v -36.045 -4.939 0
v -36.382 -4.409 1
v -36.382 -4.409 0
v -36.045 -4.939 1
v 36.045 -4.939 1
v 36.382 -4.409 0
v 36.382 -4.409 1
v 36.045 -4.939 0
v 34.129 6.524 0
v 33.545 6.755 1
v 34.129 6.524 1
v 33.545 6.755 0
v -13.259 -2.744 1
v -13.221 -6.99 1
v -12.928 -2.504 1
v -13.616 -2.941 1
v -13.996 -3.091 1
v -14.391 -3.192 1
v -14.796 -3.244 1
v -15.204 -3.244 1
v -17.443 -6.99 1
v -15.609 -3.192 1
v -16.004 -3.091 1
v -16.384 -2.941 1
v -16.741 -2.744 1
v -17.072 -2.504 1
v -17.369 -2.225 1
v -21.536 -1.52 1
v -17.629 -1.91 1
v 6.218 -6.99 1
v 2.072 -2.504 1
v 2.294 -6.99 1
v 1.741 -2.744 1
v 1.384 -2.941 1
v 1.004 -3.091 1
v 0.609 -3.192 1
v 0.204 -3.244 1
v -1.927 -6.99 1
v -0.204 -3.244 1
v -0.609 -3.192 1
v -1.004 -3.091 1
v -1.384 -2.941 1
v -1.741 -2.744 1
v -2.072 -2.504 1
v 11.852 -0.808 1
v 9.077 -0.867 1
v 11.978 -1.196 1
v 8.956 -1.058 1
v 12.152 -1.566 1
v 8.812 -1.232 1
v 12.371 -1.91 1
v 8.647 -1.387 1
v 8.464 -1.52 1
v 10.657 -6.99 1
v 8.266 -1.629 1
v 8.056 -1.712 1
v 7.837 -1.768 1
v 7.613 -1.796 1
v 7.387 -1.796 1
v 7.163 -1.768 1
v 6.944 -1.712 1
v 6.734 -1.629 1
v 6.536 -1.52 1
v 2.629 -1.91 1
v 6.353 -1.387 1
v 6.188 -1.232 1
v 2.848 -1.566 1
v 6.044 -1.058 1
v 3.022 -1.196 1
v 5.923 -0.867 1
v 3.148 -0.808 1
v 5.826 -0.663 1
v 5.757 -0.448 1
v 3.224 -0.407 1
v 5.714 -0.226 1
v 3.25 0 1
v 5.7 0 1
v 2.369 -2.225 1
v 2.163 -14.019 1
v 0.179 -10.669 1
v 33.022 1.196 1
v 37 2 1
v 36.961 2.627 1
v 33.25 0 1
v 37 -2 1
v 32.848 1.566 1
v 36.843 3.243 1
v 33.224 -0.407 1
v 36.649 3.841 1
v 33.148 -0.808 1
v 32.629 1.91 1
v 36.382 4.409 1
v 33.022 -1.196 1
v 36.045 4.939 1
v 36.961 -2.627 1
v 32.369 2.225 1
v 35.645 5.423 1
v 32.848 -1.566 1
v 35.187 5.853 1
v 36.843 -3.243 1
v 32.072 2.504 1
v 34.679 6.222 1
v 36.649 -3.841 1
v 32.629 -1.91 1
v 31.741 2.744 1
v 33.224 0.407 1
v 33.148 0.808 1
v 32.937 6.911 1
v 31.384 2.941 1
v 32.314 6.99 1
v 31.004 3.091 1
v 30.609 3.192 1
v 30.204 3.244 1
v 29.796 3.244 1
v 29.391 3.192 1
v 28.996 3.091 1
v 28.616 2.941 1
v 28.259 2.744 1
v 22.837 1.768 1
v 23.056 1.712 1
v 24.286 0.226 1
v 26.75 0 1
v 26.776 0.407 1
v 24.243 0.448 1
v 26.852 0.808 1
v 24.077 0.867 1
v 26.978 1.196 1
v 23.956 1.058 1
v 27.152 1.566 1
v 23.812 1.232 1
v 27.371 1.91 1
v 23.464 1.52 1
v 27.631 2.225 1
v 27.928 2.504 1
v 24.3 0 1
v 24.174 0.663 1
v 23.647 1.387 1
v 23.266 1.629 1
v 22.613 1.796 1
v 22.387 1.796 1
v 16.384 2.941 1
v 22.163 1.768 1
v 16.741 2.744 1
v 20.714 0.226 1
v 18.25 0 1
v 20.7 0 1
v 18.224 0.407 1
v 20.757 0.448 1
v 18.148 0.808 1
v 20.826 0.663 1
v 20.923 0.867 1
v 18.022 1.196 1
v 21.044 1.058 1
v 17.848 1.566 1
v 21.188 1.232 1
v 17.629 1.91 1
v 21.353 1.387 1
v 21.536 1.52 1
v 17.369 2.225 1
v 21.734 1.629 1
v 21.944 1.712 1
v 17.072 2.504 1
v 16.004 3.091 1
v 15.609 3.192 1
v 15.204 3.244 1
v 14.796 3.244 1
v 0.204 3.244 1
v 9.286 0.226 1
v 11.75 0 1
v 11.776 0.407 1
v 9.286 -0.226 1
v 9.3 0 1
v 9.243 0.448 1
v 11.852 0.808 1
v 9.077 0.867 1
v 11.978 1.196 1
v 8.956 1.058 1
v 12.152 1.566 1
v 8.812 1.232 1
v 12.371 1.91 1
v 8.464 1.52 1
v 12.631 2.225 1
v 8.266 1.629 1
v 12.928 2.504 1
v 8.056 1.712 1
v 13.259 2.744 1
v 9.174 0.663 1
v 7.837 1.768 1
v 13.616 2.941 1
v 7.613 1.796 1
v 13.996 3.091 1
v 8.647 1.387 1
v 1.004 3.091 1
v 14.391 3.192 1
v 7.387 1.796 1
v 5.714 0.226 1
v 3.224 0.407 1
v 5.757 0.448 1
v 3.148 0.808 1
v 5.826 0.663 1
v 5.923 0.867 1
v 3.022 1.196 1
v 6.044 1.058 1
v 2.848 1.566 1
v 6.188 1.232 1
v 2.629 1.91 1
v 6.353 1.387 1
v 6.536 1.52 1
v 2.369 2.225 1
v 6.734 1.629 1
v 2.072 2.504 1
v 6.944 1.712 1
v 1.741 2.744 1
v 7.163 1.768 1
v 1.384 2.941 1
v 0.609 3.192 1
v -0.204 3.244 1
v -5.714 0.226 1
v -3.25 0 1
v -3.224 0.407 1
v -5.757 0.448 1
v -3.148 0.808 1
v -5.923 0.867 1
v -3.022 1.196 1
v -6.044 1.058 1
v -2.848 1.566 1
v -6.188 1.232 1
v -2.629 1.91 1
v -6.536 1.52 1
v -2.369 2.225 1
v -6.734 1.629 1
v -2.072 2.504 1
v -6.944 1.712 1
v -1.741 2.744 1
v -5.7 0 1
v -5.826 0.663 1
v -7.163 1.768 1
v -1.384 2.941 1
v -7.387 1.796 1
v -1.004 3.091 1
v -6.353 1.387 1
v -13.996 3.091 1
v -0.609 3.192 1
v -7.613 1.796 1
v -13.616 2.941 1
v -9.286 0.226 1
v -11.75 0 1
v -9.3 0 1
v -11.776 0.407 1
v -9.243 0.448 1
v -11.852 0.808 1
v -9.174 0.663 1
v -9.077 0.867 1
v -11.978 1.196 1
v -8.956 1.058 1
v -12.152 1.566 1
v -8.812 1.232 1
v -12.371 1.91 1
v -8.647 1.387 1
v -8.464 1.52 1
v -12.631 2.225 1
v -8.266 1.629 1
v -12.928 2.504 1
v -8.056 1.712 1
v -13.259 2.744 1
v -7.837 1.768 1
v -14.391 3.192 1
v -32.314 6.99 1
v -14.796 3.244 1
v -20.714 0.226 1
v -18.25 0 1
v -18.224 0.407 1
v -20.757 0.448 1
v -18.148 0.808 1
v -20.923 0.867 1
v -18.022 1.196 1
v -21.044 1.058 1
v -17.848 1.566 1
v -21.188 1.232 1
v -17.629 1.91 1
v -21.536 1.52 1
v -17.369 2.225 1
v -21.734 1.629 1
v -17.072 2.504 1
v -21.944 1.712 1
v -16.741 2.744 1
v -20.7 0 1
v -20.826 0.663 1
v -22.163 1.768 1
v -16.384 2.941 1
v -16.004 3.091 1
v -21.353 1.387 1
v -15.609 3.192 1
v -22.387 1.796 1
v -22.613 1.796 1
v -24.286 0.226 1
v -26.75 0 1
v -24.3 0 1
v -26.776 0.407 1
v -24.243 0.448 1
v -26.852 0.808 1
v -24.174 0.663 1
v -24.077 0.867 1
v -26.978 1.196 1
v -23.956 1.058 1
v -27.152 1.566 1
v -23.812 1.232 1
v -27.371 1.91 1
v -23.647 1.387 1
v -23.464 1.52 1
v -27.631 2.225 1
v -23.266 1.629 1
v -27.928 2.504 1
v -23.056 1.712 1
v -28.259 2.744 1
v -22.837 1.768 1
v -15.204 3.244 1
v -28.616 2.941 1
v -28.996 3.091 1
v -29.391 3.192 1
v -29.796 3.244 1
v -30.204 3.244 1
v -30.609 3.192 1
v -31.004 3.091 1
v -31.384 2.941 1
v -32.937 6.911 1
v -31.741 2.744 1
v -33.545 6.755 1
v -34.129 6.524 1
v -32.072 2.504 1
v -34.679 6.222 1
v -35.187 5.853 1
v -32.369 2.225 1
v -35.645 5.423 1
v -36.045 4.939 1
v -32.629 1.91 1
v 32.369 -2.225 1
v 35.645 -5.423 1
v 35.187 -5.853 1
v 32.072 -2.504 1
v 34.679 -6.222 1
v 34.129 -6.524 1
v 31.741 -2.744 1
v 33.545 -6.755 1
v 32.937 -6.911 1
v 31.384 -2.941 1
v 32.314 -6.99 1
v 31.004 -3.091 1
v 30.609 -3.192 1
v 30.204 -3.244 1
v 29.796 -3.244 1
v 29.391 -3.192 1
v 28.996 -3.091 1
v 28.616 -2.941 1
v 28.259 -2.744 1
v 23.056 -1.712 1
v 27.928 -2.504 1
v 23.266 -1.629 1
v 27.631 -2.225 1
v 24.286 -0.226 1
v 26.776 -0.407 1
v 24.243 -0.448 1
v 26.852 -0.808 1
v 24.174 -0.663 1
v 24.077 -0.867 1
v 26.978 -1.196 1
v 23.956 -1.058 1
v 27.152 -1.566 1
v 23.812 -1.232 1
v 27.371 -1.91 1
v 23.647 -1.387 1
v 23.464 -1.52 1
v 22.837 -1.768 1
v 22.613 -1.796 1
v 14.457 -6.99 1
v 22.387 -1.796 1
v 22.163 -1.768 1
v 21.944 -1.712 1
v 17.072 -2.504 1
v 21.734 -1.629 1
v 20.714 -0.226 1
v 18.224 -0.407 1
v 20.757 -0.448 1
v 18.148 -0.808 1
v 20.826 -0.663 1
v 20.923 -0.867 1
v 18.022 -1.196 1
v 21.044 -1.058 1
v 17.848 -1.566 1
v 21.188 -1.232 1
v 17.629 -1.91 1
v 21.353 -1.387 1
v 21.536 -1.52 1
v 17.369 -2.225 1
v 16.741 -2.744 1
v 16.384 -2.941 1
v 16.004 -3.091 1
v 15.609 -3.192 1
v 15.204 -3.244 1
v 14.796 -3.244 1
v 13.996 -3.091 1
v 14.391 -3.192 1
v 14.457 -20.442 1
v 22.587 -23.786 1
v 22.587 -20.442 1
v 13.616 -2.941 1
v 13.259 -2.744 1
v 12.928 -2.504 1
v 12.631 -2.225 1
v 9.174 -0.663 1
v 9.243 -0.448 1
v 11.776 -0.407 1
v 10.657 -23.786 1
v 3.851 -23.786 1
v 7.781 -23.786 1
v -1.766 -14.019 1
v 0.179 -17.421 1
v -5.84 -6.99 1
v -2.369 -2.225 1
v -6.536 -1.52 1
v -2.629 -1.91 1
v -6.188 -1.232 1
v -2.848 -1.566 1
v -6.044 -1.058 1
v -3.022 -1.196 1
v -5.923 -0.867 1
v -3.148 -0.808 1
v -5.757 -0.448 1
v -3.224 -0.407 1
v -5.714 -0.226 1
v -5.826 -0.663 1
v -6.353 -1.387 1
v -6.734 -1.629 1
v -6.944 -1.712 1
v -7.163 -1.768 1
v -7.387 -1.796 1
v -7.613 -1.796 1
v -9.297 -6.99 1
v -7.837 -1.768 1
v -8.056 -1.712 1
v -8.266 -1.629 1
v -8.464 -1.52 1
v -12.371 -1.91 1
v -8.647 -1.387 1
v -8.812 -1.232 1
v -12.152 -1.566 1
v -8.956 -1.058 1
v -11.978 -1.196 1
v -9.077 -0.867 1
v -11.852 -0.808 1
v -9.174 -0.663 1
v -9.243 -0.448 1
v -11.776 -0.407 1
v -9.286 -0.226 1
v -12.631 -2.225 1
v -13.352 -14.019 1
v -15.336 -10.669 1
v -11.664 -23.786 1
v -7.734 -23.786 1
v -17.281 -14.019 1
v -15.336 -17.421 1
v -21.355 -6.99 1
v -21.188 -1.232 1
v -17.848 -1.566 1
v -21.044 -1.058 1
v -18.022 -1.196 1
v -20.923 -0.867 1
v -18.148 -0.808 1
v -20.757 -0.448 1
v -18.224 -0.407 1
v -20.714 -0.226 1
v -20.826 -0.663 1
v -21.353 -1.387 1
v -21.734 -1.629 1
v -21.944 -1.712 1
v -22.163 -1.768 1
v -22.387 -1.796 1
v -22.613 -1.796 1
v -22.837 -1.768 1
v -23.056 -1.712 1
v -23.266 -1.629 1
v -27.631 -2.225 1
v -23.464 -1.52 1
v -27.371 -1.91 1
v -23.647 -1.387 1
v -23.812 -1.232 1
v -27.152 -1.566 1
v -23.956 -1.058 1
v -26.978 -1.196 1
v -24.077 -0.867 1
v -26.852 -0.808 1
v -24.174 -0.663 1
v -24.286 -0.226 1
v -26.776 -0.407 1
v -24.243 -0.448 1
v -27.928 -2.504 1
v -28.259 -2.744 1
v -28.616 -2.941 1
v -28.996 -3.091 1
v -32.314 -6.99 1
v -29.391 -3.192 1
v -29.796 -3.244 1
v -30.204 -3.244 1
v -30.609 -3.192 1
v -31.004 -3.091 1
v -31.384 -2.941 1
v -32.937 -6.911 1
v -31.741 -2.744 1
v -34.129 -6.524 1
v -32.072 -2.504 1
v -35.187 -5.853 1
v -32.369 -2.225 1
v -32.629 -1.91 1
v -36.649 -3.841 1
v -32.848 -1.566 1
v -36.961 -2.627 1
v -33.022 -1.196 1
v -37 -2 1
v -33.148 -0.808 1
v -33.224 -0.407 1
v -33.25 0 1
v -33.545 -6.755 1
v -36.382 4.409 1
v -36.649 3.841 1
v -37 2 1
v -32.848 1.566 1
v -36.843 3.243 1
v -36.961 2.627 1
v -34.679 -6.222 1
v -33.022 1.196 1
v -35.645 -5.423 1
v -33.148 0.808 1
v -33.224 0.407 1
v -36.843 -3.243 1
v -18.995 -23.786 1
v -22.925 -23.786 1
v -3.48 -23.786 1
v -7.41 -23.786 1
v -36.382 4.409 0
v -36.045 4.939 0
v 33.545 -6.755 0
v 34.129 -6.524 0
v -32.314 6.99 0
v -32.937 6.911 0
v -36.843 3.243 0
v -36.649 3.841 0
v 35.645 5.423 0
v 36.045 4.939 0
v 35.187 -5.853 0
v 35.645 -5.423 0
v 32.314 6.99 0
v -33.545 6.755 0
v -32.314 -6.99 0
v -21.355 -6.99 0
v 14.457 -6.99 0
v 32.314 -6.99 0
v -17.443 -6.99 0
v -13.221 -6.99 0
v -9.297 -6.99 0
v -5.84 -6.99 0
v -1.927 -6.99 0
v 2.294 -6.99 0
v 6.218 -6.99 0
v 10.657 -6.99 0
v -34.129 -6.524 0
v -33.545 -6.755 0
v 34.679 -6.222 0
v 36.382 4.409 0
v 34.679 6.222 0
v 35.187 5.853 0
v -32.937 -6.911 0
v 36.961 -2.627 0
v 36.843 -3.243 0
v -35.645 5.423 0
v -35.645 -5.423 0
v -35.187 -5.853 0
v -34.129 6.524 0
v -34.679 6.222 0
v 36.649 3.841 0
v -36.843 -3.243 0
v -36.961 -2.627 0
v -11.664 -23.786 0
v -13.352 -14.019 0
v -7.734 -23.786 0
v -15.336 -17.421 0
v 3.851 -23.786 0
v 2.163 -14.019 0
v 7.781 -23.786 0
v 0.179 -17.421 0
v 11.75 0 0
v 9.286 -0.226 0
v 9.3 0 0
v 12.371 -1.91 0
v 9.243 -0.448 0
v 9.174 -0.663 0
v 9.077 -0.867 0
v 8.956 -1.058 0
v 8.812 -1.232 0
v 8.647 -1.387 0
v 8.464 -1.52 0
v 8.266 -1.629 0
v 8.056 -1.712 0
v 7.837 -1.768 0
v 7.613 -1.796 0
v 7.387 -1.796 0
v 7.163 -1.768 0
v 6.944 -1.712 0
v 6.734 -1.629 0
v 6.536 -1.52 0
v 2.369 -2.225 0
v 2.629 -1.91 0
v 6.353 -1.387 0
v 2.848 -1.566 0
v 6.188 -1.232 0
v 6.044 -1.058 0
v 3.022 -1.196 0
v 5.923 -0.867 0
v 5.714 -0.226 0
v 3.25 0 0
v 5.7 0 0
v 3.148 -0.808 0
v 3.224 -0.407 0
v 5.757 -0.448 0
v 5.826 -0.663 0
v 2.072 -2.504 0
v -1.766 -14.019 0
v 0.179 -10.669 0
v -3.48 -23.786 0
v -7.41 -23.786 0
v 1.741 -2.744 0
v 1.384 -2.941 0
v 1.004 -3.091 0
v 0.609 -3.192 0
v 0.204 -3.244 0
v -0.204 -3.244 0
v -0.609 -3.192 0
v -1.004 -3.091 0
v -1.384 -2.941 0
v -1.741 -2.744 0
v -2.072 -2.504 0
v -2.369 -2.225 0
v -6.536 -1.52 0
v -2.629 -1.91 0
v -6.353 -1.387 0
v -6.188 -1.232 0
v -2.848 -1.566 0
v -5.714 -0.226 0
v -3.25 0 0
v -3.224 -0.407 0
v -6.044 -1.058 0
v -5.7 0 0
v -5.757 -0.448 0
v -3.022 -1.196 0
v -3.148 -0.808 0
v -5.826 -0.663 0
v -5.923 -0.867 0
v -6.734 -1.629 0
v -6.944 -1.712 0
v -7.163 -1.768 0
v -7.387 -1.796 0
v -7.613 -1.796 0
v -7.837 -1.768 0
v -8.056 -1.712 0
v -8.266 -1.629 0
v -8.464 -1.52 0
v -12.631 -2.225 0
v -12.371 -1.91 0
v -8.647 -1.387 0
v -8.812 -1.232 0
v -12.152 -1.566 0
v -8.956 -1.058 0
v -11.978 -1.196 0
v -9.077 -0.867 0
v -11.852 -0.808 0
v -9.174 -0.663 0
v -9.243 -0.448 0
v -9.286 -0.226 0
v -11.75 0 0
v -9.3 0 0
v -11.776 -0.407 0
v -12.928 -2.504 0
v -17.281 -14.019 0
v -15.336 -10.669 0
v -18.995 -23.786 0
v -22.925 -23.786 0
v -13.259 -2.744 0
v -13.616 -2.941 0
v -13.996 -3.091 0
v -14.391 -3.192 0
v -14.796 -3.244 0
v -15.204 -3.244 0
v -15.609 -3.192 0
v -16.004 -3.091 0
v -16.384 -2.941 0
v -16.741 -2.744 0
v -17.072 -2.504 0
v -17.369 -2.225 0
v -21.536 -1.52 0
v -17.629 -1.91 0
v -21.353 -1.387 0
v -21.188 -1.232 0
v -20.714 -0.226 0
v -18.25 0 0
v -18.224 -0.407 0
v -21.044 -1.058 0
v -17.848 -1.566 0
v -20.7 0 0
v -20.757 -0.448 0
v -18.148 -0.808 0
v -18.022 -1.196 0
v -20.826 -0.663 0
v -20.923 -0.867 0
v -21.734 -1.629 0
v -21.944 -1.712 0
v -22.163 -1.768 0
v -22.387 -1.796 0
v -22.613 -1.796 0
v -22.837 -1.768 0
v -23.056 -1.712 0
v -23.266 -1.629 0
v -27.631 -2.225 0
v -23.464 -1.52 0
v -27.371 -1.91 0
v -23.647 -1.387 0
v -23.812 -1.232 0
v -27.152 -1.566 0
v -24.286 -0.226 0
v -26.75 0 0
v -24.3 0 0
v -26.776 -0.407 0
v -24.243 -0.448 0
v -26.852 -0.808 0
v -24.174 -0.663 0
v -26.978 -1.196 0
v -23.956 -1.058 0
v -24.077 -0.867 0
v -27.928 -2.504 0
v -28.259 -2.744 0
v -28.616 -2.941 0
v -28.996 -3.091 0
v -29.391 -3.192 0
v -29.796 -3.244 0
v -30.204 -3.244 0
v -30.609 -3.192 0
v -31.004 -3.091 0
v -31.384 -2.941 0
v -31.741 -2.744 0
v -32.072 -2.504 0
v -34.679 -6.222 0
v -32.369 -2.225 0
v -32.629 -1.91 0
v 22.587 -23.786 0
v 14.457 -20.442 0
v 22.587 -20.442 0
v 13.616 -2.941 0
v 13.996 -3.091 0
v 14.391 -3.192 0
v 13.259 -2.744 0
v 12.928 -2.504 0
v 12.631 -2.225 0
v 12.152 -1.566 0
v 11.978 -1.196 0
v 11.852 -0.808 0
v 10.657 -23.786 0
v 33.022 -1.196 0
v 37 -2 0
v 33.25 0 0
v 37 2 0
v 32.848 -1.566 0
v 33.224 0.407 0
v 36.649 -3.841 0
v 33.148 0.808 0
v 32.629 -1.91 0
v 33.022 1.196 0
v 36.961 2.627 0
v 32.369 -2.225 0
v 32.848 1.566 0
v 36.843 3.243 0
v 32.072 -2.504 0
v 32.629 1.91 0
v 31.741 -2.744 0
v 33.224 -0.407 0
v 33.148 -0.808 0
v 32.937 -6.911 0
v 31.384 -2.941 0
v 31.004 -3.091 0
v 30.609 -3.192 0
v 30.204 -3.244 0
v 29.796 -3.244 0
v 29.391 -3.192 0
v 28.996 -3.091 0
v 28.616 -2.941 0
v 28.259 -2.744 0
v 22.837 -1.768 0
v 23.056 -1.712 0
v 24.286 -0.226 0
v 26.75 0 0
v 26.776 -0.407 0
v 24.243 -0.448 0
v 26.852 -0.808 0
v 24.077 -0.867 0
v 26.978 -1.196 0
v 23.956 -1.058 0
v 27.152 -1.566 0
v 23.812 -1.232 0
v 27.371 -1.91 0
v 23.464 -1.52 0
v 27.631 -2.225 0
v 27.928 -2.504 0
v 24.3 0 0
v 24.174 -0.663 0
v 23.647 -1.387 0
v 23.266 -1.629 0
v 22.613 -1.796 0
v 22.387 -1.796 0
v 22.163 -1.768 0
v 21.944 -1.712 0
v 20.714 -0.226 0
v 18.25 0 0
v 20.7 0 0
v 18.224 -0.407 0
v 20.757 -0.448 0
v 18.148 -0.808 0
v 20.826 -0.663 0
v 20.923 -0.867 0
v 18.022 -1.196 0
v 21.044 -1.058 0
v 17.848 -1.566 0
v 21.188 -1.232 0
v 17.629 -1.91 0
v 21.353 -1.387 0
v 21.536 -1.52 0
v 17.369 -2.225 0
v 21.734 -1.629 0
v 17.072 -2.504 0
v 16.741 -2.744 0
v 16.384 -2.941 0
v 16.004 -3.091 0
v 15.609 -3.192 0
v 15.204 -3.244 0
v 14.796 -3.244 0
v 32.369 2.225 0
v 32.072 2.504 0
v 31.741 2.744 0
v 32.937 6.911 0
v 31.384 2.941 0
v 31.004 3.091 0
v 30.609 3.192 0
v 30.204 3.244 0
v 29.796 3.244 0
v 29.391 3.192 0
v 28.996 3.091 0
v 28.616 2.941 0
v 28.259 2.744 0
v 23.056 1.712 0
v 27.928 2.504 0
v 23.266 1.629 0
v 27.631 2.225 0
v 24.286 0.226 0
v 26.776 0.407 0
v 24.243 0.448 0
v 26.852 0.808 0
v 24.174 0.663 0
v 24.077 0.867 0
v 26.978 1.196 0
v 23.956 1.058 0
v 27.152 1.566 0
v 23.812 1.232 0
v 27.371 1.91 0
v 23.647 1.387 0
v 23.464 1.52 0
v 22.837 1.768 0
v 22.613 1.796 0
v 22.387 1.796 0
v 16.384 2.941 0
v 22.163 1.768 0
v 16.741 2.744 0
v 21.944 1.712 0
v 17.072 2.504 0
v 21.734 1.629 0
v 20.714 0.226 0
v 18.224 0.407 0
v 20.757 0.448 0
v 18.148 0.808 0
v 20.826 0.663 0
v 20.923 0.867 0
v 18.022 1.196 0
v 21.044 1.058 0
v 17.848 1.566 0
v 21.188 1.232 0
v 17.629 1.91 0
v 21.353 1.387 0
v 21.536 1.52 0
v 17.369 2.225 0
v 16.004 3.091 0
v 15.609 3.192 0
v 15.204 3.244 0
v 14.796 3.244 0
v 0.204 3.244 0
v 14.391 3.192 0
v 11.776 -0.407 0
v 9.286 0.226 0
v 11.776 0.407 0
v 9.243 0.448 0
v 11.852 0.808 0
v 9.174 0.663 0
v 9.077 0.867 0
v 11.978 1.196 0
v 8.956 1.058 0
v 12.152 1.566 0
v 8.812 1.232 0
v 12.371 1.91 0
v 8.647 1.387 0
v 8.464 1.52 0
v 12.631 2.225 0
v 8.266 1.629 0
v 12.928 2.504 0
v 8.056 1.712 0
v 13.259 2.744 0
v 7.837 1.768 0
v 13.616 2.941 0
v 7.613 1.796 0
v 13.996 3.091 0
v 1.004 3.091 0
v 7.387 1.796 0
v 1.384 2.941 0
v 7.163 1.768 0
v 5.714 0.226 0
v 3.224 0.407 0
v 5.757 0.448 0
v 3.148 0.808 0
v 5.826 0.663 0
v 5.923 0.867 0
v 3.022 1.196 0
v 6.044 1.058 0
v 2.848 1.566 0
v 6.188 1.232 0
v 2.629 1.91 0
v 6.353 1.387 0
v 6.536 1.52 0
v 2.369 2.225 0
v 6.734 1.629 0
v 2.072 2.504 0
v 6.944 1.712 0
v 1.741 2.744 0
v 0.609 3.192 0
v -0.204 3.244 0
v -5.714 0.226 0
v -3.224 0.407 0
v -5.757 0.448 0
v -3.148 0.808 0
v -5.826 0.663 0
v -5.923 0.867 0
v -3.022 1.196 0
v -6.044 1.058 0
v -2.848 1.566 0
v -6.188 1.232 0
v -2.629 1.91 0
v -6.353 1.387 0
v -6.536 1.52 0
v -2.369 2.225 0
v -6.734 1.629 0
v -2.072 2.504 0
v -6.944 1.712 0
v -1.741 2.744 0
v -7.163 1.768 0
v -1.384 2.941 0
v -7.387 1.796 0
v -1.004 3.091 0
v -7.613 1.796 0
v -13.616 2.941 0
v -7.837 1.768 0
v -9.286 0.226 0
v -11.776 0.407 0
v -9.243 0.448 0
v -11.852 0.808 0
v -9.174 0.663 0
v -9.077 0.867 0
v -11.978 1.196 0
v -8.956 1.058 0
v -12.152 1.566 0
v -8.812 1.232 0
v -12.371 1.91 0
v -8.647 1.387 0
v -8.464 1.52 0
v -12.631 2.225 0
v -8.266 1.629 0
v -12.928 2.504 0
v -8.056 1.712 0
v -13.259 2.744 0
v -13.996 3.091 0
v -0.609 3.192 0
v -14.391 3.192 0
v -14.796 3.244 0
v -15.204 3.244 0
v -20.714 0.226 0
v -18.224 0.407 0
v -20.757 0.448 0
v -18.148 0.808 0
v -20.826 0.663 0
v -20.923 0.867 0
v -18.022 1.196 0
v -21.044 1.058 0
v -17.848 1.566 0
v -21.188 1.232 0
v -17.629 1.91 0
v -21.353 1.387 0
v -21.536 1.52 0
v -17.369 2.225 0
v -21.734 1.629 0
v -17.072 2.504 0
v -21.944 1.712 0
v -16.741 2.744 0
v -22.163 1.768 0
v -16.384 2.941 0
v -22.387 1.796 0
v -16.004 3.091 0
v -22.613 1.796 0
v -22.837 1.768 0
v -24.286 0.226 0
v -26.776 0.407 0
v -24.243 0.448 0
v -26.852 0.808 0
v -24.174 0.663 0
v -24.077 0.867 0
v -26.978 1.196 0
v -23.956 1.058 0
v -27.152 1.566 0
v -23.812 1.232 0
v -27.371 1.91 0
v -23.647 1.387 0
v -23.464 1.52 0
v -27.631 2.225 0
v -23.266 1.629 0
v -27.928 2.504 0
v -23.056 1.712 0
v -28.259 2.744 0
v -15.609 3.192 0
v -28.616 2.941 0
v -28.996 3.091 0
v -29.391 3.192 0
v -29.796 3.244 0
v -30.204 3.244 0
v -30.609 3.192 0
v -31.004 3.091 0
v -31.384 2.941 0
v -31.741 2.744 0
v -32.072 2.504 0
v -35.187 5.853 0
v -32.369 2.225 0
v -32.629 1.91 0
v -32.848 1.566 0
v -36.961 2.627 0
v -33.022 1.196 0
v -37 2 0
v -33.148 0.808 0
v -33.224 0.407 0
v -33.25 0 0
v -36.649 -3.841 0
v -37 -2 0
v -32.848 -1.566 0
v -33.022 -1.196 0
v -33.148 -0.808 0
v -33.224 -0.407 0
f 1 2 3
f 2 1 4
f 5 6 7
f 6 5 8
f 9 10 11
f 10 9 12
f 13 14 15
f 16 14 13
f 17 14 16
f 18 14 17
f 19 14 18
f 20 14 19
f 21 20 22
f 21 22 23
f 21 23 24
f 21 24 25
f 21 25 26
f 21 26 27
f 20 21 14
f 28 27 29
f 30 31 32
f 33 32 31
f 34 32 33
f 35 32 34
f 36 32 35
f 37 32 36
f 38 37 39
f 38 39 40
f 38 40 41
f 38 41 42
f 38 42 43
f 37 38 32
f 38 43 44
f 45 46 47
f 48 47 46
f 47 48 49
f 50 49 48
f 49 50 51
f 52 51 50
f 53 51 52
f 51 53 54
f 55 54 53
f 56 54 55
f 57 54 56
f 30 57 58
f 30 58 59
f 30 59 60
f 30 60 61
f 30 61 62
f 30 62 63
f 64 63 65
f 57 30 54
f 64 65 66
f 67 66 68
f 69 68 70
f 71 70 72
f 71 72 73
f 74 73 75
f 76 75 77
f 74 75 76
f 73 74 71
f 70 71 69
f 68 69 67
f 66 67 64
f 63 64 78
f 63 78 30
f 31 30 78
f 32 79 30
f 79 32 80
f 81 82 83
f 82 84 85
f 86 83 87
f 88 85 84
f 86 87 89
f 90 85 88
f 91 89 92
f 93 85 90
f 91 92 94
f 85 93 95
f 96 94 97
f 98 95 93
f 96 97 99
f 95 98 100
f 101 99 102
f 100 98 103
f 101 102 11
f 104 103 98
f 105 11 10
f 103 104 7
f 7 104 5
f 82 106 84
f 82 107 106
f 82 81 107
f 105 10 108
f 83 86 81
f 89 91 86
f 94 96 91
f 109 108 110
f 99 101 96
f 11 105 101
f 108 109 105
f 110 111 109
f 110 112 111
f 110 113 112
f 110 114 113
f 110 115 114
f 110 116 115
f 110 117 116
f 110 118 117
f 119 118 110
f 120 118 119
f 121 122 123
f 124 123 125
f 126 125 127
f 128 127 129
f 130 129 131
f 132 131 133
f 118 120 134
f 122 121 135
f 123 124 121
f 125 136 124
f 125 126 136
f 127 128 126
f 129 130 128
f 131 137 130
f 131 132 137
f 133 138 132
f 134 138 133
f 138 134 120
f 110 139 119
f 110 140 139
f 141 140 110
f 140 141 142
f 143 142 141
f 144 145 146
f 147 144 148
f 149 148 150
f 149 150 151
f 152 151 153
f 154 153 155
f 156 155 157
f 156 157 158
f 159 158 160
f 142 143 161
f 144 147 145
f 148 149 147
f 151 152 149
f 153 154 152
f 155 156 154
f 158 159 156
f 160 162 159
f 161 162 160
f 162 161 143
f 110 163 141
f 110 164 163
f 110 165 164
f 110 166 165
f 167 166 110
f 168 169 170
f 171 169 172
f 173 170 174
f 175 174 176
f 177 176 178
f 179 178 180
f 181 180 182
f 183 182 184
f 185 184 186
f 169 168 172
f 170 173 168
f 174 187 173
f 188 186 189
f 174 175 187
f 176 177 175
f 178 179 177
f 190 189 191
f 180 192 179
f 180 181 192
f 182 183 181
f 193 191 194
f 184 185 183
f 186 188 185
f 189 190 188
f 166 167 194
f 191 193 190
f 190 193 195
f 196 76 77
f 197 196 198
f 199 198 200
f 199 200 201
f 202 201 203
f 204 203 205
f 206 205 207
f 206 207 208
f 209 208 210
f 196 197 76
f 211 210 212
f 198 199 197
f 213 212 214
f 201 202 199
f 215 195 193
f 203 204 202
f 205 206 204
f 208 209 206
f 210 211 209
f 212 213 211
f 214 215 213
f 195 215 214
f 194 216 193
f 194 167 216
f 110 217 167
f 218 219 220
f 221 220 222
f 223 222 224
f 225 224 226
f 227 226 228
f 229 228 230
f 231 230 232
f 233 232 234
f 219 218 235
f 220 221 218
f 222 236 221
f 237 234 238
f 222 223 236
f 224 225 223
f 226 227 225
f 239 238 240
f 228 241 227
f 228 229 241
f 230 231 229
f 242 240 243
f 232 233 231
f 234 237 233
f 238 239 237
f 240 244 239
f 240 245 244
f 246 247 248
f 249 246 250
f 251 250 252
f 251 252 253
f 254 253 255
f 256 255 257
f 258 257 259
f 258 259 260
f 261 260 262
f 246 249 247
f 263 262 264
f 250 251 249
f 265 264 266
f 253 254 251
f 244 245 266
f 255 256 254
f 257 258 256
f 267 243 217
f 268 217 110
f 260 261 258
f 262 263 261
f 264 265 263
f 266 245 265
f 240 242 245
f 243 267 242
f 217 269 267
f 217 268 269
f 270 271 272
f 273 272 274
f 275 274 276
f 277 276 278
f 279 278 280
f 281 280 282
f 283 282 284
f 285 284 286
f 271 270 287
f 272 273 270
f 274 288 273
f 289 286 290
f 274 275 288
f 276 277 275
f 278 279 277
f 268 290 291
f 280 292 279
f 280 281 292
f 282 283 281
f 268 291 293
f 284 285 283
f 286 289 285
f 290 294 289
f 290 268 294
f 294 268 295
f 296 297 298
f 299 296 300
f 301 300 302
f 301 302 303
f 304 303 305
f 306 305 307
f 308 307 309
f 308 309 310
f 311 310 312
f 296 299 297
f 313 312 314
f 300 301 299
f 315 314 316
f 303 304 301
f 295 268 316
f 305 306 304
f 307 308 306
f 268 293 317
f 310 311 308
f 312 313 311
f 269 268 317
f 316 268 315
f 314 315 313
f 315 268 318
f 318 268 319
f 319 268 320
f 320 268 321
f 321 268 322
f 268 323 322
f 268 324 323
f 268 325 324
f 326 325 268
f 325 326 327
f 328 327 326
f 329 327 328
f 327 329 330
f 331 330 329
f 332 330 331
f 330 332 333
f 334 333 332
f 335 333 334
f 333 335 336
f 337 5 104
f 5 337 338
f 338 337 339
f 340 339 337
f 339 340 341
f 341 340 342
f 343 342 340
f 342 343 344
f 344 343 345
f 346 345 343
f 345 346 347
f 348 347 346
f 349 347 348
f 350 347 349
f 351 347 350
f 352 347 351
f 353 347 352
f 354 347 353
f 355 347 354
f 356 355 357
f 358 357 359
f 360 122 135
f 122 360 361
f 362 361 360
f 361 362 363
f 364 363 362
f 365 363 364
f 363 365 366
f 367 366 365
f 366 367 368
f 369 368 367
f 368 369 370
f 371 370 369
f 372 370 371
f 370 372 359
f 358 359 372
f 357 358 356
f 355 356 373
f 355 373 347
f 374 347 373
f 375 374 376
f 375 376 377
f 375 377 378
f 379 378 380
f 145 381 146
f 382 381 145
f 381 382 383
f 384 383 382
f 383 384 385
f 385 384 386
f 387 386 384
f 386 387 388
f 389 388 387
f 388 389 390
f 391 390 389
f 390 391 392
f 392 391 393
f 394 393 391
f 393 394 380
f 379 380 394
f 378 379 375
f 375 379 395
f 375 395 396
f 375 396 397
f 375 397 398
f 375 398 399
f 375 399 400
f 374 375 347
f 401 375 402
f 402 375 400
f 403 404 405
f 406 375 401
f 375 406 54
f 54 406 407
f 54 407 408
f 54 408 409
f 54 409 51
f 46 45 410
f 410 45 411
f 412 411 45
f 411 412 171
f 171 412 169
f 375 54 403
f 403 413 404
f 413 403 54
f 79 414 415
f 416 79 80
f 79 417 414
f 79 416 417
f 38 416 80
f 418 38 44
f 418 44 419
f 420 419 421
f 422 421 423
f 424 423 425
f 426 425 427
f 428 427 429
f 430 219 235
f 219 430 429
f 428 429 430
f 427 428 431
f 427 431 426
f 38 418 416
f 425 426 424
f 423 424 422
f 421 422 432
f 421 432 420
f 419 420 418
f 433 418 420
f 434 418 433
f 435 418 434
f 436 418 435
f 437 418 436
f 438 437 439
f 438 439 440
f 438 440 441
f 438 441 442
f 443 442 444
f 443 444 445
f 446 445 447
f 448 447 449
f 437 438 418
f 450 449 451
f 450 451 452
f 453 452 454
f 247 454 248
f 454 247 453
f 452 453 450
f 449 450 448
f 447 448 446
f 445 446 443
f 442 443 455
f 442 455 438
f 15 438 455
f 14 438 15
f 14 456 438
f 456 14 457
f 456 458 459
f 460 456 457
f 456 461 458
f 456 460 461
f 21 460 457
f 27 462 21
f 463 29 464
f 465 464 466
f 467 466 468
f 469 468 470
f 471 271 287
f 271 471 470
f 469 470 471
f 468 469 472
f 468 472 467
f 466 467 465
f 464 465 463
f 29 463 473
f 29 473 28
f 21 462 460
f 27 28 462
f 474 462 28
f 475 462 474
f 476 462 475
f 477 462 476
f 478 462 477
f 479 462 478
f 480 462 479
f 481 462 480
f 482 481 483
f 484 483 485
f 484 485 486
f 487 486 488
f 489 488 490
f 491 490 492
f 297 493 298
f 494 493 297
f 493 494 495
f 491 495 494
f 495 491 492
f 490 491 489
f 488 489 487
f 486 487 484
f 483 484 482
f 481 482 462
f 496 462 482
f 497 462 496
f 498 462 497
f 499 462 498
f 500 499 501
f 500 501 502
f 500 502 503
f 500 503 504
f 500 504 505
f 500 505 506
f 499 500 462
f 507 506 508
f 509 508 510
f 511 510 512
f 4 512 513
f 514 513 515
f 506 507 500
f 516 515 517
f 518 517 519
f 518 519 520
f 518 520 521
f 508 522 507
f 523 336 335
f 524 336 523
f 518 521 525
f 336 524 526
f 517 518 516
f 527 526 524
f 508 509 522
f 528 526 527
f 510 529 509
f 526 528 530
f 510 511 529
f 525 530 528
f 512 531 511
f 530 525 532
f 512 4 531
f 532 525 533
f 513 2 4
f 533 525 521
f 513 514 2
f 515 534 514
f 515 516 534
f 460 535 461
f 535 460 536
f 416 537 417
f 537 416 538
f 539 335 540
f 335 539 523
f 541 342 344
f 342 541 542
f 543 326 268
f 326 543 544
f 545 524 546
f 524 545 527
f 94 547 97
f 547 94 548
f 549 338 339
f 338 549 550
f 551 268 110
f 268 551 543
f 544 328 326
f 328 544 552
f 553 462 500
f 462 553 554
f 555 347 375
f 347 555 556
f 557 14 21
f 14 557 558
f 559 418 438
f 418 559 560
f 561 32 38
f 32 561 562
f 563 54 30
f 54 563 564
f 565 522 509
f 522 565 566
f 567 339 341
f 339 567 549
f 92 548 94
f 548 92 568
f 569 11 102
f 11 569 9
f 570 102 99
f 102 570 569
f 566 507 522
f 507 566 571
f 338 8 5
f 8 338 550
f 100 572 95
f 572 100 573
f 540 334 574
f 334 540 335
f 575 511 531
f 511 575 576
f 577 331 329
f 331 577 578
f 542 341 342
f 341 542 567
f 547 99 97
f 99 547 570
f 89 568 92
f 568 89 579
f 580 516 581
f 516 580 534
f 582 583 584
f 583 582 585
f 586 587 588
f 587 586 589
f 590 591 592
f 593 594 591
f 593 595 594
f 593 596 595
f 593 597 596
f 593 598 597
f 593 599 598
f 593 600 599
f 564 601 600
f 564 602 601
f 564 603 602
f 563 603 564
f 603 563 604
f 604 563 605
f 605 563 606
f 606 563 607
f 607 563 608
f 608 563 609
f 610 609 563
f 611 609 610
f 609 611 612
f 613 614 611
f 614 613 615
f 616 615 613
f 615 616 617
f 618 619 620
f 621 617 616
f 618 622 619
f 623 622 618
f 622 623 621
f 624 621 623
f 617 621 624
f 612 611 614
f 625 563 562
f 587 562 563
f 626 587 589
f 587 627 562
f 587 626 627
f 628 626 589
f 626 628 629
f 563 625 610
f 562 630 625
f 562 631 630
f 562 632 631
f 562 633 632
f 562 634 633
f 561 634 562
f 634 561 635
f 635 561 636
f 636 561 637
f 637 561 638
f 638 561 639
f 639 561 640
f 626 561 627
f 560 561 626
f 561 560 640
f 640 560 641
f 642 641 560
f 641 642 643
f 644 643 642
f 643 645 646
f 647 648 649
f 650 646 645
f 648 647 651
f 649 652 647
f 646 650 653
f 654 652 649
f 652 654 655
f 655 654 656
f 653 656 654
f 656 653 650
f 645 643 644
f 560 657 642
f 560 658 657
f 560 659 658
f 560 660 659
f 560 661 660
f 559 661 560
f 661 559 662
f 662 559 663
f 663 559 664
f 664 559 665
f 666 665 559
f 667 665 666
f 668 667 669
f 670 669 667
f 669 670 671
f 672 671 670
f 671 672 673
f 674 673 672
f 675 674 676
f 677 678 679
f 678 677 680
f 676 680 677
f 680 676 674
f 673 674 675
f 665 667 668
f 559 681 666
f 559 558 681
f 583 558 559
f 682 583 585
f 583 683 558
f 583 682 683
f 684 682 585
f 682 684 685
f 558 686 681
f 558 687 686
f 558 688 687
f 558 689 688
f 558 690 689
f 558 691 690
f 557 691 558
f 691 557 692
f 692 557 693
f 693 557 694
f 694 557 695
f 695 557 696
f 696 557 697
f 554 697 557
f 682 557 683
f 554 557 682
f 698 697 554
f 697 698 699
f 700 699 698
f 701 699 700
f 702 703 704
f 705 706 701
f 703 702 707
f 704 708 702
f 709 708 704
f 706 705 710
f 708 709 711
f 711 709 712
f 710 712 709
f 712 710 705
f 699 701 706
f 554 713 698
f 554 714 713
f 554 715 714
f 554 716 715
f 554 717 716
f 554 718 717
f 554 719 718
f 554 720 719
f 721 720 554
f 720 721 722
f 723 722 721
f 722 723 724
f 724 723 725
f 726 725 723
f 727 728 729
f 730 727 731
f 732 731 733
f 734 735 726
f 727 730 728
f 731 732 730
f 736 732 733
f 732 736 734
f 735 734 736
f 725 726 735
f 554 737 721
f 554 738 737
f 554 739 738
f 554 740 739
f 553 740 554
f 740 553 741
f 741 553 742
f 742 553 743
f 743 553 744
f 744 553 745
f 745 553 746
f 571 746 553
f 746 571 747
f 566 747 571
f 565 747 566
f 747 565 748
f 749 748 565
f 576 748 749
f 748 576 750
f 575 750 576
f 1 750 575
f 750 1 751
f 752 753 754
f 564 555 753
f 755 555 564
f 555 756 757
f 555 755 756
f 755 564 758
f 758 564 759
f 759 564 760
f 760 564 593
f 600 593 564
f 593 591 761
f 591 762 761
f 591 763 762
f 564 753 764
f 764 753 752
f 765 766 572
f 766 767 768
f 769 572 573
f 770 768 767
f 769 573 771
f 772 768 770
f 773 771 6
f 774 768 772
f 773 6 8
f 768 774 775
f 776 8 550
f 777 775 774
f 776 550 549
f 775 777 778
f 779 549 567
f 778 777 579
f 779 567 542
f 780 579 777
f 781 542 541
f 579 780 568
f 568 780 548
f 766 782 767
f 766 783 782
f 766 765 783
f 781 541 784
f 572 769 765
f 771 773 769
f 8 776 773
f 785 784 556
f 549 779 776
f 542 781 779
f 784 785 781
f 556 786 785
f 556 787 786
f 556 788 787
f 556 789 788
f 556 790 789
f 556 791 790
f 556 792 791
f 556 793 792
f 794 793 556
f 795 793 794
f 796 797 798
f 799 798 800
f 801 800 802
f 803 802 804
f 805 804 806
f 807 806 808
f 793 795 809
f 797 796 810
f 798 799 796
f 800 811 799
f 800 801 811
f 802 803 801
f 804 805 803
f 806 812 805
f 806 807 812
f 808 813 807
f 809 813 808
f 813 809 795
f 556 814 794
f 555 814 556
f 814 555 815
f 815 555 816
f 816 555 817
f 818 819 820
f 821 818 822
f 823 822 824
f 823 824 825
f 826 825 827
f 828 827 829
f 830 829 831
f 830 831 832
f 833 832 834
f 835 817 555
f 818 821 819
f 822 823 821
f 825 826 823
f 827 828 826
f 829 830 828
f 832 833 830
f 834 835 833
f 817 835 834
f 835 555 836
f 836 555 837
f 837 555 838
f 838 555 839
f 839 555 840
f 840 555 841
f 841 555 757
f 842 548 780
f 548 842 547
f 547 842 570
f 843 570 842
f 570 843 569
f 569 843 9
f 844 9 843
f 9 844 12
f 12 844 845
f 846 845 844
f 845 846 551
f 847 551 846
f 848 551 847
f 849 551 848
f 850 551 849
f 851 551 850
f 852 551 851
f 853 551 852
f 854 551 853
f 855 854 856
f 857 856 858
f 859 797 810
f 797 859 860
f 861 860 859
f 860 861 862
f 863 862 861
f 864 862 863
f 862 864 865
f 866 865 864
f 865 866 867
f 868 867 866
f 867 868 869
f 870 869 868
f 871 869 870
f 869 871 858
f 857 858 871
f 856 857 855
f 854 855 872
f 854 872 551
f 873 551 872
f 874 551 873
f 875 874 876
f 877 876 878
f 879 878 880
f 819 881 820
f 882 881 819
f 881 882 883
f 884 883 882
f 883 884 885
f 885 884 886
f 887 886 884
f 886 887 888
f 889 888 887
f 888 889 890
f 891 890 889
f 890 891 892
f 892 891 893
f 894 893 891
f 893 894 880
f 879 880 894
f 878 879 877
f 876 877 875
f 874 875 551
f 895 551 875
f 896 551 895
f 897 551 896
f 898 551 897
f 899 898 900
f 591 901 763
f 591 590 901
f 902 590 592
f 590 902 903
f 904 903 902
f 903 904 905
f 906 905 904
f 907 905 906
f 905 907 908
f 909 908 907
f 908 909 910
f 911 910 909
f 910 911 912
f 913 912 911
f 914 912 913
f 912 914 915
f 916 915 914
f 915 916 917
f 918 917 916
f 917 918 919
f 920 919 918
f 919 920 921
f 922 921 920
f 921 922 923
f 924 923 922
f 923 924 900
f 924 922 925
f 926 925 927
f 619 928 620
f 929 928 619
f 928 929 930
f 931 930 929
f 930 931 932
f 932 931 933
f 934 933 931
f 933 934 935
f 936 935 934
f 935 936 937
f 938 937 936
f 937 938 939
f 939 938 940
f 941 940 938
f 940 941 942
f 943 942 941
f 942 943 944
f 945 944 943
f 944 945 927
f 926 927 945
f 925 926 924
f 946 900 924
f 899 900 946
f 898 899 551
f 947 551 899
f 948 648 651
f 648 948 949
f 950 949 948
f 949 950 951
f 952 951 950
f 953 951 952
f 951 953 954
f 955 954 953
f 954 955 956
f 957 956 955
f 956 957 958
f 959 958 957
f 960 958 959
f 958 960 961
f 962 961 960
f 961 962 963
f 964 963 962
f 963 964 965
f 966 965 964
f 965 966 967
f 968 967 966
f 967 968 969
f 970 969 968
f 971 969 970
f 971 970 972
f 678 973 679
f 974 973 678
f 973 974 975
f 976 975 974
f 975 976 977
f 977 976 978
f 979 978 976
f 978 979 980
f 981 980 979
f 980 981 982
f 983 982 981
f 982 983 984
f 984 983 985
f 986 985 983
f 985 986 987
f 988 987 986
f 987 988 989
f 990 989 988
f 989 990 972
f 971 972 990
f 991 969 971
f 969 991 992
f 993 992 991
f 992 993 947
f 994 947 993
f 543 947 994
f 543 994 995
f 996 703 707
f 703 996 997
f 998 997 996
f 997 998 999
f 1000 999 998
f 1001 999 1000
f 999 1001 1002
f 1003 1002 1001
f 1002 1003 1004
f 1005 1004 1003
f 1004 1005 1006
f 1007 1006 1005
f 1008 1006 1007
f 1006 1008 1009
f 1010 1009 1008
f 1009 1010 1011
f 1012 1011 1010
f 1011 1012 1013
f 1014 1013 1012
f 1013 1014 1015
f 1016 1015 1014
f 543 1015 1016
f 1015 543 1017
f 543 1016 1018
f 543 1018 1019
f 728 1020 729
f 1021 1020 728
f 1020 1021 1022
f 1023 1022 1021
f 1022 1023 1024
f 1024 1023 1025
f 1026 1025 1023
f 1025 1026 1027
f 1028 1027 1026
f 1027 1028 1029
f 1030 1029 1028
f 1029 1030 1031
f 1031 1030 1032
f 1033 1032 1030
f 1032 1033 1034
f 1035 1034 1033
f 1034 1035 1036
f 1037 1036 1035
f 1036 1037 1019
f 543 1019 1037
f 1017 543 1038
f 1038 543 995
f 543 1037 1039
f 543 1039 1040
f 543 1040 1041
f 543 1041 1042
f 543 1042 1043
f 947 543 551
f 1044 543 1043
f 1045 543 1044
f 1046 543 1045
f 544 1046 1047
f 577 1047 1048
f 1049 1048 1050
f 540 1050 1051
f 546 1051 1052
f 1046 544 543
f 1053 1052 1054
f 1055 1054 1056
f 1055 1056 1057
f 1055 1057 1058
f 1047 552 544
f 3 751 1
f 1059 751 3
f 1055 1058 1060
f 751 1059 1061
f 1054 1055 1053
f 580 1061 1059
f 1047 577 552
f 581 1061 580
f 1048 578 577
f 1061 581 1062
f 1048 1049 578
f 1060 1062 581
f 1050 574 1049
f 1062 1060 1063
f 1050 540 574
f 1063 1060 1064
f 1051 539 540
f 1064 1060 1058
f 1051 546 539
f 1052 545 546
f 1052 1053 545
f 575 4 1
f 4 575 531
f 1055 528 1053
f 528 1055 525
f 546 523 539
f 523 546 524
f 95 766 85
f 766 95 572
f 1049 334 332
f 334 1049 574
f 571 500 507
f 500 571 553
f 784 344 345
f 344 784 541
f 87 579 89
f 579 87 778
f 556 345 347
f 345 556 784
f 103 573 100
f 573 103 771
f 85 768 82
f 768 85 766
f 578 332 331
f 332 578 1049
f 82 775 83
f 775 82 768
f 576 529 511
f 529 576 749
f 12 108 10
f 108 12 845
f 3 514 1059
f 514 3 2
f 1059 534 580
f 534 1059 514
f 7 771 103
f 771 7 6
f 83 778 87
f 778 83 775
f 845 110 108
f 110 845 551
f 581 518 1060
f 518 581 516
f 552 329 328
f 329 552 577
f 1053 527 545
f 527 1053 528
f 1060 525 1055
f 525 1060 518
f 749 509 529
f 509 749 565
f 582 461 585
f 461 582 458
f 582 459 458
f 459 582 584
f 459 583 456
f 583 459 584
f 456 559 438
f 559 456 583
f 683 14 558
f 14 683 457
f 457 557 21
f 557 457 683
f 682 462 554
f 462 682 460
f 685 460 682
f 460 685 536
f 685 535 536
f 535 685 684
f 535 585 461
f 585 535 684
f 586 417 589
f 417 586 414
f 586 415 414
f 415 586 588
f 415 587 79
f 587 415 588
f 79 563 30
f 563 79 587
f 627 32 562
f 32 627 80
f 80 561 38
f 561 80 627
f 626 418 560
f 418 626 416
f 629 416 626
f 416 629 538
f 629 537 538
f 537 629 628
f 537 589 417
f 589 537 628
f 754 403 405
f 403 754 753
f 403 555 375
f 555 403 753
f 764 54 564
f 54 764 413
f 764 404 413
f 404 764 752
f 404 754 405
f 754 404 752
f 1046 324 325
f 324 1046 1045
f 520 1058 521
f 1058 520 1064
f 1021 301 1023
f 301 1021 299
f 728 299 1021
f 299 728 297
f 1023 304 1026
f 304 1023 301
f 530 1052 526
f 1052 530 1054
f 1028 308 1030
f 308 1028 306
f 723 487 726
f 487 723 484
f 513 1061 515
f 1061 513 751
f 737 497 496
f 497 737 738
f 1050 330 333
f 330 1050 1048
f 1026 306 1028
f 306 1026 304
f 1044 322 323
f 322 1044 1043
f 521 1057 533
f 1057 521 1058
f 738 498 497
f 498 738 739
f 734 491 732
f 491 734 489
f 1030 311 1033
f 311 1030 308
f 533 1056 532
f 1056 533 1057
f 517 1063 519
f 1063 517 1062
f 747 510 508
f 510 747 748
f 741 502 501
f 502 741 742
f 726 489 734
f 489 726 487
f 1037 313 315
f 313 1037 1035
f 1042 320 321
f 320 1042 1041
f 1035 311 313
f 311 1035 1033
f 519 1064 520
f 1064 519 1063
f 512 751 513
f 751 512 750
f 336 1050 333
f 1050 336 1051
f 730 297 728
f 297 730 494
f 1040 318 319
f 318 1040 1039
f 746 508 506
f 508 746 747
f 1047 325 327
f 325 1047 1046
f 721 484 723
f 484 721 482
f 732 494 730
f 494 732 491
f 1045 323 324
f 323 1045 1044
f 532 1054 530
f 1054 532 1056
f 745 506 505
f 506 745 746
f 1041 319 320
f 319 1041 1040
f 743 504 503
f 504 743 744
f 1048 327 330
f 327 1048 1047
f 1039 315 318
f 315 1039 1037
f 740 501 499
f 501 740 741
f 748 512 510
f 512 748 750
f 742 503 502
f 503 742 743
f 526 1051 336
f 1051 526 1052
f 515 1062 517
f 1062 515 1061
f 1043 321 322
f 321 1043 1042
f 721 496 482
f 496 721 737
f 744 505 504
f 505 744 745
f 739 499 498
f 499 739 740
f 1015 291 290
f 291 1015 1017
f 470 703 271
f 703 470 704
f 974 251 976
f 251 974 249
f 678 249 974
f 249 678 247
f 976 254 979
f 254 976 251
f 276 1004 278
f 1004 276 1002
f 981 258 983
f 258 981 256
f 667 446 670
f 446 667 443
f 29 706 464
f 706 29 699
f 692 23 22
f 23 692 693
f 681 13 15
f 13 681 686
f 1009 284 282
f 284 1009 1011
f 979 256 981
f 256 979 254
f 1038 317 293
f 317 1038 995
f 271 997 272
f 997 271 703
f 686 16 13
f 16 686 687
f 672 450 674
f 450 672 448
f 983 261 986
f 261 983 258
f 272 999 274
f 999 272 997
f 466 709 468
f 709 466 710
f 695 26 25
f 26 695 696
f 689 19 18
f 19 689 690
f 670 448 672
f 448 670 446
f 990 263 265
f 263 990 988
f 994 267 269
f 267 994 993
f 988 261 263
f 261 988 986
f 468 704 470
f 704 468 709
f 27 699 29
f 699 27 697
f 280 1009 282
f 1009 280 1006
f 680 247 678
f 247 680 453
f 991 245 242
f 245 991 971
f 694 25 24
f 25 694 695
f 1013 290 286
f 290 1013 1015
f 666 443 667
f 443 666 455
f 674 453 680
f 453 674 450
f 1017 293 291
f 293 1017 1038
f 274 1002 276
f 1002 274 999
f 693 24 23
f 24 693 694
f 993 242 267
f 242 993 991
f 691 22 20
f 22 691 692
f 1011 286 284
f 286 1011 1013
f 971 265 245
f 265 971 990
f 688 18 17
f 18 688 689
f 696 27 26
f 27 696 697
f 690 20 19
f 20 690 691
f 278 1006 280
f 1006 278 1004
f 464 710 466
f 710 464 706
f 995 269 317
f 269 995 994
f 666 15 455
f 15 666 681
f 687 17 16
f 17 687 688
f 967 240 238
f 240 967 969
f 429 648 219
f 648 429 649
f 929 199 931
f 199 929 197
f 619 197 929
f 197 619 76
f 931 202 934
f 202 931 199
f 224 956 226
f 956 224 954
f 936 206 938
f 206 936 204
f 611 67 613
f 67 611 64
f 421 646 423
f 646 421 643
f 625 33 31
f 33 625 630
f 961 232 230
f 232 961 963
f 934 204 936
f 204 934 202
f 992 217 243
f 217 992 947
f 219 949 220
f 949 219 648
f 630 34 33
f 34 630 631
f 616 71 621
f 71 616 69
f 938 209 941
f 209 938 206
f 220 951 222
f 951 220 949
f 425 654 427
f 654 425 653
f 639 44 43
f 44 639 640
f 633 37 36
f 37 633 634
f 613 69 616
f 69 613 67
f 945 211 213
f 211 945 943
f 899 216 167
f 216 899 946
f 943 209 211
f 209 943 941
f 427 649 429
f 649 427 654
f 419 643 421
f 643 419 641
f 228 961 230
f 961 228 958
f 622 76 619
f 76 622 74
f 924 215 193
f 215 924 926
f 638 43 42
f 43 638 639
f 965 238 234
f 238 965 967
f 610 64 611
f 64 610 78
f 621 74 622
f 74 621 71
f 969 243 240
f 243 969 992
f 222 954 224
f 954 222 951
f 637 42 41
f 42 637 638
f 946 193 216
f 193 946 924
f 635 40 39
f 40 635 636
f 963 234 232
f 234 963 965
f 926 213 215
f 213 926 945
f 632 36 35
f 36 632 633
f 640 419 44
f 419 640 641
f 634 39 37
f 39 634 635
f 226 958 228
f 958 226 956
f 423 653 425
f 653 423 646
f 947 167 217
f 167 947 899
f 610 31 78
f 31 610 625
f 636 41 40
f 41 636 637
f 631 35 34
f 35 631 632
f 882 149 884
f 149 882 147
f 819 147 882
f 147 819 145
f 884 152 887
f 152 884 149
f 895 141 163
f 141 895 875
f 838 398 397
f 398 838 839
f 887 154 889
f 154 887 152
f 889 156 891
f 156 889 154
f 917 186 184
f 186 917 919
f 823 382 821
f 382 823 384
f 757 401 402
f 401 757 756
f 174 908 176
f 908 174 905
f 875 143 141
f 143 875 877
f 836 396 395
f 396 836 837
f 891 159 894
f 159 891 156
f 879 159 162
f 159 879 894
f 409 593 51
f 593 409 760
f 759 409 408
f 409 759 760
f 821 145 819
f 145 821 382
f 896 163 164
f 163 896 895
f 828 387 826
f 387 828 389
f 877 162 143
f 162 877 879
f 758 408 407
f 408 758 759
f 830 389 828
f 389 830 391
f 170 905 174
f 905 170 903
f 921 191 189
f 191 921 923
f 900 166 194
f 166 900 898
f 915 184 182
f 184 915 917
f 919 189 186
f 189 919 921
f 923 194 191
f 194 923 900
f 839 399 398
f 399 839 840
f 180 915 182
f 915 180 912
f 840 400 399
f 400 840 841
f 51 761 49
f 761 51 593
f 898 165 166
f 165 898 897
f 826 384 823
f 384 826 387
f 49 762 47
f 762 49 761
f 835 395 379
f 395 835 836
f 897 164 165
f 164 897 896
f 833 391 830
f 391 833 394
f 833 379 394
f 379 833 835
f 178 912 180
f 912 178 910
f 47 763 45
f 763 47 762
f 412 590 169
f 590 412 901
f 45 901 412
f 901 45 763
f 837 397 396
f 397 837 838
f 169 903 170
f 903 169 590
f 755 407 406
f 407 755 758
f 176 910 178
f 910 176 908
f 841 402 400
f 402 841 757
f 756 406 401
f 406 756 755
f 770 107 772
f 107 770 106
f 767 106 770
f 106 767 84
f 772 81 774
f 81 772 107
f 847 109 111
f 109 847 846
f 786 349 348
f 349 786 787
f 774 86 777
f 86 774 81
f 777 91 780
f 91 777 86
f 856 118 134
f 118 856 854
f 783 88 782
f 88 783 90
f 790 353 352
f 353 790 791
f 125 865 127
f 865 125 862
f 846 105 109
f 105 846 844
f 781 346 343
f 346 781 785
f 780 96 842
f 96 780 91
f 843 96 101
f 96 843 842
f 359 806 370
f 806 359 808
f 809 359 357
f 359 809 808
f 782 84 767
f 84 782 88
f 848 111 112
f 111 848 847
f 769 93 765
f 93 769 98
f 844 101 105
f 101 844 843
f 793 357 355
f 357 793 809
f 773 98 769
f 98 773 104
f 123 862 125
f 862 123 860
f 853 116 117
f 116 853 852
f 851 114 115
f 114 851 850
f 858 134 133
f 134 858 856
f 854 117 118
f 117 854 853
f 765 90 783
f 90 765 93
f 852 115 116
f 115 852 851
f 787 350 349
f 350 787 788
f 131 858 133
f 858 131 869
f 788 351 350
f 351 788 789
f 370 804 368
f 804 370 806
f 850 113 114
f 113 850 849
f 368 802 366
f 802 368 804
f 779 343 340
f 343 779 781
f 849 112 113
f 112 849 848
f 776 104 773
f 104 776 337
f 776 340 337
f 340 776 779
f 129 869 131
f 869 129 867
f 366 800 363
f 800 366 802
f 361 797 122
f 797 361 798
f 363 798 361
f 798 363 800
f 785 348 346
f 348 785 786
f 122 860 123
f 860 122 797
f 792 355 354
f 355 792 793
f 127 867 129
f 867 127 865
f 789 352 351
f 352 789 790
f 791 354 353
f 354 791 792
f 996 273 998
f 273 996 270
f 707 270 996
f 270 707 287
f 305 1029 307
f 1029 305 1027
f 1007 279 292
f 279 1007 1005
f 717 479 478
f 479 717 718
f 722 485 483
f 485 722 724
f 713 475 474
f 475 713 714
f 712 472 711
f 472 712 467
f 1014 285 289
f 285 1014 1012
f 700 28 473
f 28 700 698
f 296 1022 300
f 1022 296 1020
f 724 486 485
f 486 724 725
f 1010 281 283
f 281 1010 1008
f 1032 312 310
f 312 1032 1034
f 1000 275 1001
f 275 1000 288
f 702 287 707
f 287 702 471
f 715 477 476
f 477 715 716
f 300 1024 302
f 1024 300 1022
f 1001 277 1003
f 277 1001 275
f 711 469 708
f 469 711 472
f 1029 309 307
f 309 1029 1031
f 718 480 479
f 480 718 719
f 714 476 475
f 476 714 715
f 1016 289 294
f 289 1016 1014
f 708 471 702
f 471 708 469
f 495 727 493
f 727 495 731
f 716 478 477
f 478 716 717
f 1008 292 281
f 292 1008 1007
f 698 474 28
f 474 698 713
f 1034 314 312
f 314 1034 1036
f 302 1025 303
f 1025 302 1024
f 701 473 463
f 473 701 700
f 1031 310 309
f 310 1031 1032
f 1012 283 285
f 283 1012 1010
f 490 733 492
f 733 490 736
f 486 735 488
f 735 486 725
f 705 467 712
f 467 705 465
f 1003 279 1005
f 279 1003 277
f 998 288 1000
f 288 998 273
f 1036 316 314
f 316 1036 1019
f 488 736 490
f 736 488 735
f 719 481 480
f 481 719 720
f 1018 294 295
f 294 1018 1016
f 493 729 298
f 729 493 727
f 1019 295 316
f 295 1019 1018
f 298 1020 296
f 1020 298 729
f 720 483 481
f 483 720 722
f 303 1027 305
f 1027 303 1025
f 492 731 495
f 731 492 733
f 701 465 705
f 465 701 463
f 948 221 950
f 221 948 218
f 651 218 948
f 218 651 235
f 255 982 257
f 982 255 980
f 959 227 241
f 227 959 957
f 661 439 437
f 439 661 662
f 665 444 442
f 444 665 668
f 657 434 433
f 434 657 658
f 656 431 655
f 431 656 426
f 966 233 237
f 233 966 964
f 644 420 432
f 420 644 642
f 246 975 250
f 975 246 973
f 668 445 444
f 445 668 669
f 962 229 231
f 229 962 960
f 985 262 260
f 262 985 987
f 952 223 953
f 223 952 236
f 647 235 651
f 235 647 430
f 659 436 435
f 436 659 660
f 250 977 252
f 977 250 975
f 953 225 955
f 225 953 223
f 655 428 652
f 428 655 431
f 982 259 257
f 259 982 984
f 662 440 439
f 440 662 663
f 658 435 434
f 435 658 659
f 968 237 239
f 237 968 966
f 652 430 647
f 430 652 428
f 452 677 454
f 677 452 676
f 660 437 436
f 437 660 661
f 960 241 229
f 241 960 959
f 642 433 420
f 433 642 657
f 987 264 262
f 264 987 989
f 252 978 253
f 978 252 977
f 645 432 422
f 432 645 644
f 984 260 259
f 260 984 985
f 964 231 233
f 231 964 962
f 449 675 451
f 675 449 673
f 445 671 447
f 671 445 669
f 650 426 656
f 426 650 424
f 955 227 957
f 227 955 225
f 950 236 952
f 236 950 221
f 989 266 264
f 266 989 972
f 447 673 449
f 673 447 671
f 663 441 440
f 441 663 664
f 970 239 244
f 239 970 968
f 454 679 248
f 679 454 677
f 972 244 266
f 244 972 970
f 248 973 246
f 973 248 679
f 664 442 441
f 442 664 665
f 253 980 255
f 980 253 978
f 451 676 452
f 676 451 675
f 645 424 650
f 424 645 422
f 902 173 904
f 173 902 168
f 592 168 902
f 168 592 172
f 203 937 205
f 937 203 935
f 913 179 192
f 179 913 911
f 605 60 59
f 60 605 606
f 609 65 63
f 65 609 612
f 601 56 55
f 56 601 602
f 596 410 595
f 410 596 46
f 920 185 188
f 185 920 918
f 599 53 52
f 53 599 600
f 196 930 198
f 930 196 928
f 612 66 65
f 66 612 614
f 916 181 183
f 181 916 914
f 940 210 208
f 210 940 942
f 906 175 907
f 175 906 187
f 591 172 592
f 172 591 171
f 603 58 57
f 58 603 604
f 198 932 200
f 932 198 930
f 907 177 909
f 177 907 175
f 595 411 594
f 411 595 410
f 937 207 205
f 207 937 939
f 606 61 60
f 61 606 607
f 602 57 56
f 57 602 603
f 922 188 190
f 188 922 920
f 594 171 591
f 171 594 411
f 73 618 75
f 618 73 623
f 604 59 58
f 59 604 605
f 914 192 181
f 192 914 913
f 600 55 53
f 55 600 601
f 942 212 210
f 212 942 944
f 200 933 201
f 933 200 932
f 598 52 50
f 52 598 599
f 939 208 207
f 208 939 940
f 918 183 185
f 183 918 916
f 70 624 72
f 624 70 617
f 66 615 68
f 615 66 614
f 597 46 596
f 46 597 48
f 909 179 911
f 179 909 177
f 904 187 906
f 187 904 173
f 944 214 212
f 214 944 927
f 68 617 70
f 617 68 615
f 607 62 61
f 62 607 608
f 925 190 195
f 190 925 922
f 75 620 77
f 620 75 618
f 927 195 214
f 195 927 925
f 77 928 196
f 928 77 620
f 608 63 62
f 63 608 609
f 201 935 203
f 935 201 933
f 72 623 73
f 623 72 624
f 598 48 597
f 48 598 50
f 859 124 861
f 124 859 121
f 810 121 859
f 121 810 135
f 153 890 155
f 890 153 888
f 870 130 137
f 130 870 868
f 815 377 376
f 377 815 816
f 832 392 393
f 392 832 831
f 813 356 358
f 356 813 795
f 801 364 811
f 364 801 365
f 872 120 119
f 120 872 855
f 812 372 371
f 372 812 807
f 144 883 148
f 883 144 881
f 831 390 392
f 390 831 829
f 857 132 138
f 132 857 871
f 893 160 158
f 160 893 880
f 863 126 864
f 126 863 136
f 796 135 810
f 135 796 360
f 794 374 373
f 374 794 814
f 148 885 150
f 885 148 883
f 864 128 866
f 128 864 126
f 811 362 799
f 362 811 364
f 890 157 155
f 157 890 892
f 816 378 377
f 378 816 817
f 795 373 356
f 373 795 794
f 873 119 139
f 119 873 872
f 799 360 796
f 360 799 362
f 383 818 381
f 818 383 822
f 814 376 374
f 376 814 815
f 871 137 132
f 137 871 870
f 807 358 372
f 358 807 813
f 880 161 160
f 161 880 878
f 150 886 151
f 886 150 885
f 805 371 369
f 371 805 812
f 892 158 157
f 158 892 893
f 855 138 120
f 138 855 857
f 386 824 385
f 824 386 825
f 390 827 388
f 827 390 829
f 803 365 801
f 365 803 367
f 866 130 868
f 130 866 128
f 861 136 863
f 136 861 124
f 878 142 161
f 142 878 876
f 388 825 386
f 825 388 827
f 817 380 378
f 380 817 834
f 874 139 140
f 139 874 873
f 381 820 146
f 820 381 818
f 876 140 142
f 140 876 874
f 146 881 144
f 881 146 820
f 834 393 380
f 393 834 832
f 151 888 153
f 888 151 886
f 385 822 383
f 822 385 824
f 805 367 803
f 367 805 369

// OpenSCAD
$fn = 50;


difference() {
	union() {
		hull() {
			translate(v = [-32.0000000000, 2.0000000000, 0]) {
				cylinder(h = 1, r = 5);
			}
			translate(v = [32.0000000000, 2.0000000000, 0]) {
				cylinder(h = 1, r = 5);
			}
			translate(v = [-32.0000000000, -2.0000000000, 0]) {
				cylinder(h = 1, r = 5);
			}
			translate(v = [32.0000000000, -2.0000000000, 0]) {
				cylinder(h = 1, r = 5);
			}
		}
		translate(v = [0, -5, 0]) {
			linear_extrude(height = 1) {
				text(font = "DejaVu Sans Mono:style=Bold", halign = "center", size = 19.0000000000, text = "XXL", valign = "top");
			}
		}
	}
	union() {
		translate(v = [-30.0000000000, 0.0000000000, 0]) {
			translate(v = [0, 0, -100]) {
				cylinder(h = 200, r = 3.2500000000);
			}
		}
		translate(v = [-15.0000000000, 0.0000000000, 0]) {
			translate(v = [0, 0, -100]) {
				cylinder(h = 200, r = 3.2500000000);
			}
		}
		translate(v = [0, 0, -100]) {
			cylinder(h = 200, r = 3.2500000000);
		}
		translate(v = [15.0000000000, 0.0000000000, 0]) {
			translate(v = [0, 0, -100]) {
				cylinder(h = 200, r = 3.2500000000);
			}
		}
		translate(v = [30.0000000000, 0.0000000000, 0]) {
			translate(v = [0, 0, -100]) {
				cylinder(h = 200, r = 3.2500000000);
			}
		}
		translate(v = [-30.0000000000, 0.0000000000, 0]) {
			translate(v = [0, 0, -100]) {
				cylinder(h = 200, r = 1.8000000000);
			}
		}
		translate(v = [-22.5000000000, 0.0000000000, 0]) {
			translate(v = [0, 0, -100]) {
				cylinder(h = 200, r = 1.8000000000);
			}
		}
		translate(v = [-15.0000000000, 0.0000000000, 0]) {
			translate(v = [0, 0, -100]) {
				cylinder(h = 200, r = 1.8000000000);
			}
		}
		translate(v = [-7.5000000000, 0.0000000000, 0]) {
			translate(v = [0, 0, -100]) {
				cylinder(h = 200, r = 1.8000000000);
			}
		}
		translate(v = [0, 0, -100]) {
			cylinder(h = 200, r = 1.8000000000);
		}
		translate(v = [7.5000000000, 0.0000000000, 0]) {
			translate(v = [0, 0, -100]) {
				cylinder(h = 200, r = 1.8000000000);
			}
		}
		translate(v = [15.0000000000, 0.0000000000, 0]) {
			translate(v = [0, 0, -100]) {
				cylinder(h = 200, r = 1.8000000000);
			}
		}
		translate(v = [22.5000000000, 0.0000000000, 0]) {
			translate(v = [0, 0, -100]) {
				cylinder(h = 200, r = 1.8000000000);
			}
		}
		translate(v = [30.0000000000, 0.0000000000, 0]) {
			translate(v = [0, 0, -100]) {
				cylinder(h = 200, r = 1.8000000000);
			}
		}
	}
}
